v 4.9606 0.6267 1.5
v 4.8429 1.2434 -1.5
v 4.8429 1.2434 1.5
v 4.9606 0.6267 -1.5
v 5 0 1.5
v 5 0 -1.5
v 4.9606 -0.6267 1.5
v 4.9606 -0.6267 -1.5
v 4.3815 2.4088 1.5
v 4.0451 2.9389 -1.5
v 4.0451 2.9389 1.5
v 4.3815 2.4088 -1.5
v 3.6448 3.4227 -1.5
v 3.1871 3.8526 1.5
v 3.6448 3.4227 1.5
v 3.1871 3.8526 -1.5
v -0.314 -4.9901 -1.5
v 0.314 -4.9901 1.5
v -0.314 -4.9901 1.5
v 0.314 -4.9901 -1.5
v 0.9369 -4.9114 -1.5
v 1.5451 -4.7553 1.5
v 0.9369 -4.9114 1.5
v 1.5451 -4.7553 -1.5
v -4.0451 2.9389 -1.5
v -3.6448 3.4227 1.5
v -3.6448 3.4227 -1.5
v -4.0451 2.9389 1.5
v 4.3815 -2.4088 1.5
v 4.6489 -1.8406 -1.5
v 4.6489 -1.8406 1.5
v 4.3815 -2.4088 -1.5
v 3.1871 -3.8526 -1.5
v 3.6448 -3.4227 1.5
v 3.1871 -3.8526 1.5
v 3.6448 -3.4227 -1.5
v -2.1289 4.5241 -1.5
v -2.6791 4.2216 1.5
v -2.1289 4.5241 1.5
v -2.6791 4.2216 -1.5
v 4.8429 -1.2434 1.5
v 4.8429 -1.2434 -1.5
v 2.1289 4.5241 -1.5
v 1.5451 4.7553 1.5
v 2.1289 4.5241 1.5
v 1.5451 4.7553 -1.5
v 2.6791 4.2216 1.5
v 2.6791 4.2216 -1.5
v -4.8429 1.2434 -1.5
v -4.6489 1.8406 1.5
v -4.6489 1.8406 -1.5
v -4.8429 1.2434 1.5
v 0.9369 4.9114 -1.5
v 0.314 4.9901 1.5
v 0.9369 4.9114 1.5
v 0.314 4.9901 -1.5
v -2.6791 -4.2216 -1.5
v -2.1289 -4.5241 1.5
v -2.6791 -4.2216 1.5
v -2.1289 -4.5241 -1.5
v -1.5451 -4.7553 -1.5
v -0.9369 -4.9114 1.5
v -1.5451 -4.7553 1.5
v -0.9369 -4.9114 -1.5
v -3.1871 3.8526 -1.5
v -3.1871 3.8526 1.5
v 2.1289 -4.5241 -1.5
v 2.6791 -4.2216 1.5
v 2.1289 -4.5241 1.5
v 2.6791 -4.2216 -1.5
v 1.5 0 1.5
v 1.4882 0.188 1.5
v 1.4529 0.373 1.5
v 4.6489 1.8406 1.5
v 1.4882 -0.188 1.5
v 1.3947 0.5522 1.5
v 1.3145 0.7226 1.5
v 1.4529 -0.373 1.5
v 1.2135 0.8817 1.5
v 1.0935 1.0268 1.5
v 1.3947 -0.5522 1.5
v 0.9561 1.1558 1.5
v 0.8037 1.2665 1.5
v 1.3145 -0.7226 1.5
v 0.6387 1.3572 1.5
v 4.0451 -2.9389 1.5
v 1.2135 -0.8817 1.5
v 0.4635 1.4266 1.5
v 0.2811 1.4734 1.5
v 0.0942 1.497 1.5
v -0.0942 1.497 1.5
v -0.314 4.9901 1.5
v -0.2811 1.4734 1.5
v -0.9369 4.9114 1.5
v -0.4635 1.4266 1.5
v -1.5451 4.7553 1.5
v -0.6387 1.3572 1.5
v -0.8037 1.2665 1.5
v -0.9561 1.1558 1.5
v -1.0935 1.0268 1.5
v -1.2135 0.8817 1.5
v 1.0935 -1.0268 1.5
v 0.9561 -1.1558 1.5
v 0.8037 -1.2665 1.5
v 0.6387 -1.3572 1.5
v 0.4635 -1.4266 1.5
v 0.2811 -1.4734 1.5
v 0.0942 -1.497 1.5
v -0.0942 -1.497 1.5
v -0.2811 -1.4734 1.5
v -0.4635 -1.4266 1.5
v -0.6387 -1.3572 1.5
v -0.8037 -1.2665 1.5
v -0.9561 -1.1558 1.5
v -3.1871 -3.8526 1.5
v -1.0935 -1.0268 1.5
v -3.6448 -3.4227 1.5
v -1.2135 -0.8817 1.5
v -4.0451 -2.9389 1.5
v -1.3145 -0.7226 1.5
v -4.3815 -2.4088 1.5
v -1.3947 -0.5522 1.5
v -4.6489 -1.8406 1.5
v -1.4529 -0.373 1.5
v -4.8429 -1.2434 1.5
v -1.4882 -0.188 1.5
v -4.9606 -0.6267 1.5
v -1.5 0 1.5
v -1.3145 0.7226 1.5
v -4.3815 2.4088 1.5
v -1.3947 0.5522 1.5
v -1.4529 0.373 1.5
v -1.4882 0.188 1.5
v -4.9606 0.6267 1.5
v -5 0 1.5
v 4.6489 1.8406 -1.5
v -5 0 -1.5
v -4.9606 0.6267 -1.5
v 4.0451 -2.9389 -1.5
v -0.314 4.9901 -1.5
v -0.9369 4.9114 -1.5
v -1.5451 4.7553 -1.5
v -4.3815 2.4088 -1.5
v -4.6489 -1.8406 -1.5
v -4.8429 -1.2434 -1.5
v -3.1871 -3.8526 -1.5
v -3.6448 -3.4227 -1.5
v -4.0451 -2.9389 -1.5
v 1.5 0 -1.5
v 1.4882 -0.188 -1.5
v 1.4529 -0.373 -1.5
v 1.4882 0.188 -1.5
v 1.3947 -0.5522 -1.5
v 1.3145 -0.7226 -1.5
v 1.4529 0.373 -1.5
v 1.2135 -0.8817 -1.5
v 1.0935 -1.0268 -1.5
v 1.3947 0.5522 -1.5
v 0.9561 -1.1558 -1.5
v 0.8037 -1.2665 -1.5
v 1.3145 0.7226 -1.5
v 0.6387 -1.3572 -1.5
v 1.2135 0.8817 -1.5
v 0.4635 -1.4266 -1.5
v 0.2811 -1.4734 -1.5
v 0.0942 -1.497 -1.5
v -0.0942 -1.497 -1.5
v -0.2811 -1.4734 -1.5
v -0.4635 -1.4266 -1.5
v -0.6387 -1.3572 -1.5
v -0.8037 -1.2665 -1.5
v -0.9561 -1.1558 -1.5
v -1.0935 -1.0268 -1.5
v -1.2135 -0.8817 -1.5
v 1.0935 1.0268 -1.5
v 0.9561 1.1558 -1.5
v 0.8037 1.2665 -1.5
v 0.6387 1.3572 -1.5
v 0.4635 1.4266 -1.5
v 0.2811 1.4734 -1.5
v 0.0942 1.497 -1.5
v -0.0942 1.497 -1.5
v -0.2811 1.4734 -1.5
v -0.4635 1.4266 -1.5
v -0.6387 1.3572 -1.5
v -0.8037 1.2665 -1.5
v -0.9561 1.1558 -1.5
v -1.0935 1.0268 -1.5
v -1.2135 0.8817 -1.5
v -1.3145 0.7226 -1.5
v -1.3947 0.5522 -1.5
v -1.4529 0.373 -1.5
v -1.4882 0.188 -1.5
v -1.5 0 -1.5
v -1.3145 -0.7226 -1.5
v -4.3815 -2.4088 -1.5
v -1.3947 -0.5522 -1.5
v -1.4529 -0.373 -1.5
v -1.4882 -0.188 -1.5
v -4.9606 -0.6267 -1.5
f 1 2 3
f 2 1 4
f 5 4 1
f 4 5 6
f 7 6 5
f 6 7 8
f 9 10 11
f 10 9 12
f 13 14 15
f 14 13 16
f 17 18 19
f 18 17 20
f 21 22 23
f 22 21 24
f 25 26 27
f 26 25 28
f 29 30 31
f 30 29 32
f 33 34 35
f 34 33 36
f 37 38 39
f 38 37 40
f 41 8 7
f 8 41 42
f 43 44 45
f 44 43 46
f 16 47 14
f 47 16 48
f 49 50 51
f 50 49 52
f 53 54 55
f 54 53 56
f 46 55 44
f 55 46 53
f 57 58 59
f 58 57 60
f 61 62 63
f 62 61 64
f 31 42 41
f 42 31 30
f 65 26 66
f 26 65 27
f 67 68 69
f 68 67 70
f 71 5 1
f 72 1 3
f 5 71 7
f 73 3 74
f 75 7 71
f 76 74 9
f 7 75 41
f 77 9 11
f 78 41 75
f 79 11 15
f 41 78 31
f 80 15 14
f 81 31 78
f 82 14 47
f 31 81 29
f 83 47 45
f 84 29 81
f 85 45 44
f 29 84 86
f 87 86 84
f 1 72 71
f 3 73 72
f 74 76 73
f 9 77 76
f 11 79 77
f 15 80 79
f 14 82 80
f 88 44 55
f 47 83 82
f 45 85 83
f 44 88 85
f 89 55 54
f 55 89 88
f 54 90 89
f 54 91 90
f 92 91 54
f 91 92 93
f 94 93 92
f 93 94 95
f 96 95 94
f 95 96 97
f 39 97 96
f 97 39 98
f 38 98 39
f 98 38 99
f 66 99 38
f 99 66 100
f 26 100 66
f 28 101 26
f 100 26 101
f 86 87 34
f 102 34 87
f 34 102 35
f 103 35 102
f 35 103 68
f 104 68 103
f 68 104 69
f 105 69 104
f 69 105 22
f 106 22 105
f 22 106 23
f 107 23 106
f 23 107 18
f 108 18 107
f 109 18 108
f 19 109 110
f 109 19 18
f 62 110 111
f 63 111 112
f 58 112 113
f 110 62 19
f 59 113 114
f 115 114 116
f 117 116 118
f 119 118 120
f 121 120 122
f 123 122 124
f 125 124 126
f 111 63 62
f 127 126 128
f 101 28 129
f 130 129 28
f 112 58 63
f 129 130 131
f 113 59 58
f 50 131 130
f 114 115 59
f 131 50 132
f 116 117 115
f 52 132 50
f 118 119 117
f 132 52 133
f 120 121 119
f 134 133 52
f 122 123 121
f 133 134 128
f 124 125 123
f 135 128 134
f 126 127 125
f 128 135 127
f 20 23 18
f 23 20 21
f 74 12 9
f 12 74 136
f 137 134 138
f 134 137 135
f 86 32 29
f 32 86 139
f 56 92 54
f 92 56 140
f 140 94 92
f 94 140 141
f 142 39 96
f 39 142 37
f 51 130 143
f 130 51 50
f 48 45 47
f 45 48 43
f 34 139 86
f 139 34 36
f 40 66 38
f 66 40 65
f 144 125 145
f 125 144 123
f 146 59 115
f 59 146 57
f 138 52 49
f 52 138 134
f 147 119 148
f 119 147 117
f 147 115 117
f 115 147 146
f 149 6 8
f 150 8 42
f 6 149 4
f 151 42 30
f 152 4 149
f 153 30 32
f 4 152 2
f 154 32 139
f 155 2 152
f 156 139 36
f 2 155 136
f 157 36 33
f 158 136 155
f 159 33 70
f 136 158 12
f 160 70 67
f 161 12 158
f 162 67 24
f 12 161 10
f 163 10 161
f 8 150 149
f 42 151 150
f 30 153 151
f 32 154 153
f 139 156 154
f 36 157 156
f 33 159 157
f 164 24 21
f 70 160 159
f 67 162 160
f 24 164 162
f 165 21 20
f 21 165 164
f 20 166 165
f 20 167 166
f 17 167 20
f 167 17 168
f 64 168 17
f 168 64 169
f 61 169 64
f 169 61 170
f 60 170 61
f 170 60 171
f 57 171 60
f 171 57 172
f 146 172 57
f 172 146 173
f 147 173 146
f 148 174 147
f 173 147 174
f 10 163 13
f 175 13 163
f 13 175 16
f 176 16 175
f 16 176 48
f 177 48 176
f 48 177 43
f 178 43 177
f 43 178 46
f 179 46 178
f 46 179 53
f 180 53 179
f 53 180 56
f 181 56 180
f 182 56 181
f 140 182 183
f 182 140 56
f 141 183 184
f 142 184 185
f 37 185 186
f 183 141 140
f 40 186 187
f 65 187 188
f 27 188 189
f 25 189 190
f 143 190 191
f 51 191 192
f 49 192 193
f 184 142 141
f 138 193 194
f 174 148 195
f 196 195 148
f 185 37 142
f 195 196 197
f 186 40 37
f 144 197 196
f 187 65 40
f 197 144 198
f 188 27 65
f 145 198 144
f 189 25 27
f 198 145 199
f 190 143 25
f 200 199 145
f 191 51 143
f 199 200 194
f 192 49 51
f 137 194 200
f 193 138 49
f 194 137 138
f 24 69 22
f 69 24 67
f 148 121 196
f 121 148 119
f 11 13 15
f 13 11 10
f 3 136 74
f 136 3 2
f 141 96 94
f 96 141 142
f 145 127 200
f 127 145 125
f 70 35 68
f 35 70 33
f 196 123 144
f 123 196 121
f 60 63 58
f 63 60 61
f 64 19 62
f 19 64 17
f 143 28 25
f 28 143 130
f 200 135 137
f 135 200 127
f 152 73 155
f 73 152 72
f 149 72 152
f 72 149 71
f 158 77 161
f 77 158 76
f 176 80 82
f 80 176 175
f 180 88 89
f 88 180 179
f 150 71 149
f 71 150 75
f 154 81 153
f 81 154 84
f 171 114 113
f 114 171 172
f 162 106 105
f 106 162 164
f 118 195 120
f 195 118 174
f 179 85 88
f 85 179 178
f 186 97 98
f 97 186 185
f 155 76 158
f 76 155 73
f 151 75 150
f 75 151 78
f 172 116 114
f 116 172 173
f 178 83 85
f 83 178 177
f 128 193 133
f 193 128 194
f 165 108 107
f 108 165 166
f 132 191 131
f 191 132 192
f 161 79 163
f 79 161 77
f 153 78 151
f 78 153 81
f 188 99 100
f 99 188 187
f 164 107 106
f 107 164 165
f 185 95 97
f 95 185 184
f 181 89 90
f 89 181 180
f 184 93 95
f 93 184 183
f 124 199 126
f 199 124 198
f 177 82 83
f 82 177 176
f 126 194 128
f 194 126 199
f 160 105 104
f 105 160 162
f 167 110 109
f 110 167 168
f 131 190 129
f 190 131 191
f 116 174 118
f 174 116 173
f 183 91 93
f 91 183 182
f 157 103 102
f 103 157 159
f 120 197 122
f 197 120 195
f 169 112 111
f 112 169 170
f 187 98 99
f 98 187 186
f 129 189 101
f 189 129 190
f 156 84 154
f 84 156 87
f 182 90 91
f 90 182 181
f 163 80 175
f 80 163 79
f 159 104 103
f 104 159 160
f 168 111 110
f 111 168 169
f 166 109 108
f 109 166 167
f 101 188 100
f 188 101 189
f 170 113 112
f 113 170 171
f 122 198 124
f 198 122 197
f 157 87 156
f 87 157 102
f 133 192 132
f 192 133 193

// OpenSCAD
$fn = 50;


difference() {
	union() {
		translate(v = [0, 0, -1.5000000000]) {
			cylinder(h = 3, r = 5.0000000000);
		}
		translate(v = [0, 0, -1.5000000000]) {
			cylinder(h = 3, r = 3.0000000000);
		}
	}
	union() {
		translate(v = [0, 0, -100.0000000000]) {
			cylinder(h = 200, r = 1.5000000000);
		}
	}
}
